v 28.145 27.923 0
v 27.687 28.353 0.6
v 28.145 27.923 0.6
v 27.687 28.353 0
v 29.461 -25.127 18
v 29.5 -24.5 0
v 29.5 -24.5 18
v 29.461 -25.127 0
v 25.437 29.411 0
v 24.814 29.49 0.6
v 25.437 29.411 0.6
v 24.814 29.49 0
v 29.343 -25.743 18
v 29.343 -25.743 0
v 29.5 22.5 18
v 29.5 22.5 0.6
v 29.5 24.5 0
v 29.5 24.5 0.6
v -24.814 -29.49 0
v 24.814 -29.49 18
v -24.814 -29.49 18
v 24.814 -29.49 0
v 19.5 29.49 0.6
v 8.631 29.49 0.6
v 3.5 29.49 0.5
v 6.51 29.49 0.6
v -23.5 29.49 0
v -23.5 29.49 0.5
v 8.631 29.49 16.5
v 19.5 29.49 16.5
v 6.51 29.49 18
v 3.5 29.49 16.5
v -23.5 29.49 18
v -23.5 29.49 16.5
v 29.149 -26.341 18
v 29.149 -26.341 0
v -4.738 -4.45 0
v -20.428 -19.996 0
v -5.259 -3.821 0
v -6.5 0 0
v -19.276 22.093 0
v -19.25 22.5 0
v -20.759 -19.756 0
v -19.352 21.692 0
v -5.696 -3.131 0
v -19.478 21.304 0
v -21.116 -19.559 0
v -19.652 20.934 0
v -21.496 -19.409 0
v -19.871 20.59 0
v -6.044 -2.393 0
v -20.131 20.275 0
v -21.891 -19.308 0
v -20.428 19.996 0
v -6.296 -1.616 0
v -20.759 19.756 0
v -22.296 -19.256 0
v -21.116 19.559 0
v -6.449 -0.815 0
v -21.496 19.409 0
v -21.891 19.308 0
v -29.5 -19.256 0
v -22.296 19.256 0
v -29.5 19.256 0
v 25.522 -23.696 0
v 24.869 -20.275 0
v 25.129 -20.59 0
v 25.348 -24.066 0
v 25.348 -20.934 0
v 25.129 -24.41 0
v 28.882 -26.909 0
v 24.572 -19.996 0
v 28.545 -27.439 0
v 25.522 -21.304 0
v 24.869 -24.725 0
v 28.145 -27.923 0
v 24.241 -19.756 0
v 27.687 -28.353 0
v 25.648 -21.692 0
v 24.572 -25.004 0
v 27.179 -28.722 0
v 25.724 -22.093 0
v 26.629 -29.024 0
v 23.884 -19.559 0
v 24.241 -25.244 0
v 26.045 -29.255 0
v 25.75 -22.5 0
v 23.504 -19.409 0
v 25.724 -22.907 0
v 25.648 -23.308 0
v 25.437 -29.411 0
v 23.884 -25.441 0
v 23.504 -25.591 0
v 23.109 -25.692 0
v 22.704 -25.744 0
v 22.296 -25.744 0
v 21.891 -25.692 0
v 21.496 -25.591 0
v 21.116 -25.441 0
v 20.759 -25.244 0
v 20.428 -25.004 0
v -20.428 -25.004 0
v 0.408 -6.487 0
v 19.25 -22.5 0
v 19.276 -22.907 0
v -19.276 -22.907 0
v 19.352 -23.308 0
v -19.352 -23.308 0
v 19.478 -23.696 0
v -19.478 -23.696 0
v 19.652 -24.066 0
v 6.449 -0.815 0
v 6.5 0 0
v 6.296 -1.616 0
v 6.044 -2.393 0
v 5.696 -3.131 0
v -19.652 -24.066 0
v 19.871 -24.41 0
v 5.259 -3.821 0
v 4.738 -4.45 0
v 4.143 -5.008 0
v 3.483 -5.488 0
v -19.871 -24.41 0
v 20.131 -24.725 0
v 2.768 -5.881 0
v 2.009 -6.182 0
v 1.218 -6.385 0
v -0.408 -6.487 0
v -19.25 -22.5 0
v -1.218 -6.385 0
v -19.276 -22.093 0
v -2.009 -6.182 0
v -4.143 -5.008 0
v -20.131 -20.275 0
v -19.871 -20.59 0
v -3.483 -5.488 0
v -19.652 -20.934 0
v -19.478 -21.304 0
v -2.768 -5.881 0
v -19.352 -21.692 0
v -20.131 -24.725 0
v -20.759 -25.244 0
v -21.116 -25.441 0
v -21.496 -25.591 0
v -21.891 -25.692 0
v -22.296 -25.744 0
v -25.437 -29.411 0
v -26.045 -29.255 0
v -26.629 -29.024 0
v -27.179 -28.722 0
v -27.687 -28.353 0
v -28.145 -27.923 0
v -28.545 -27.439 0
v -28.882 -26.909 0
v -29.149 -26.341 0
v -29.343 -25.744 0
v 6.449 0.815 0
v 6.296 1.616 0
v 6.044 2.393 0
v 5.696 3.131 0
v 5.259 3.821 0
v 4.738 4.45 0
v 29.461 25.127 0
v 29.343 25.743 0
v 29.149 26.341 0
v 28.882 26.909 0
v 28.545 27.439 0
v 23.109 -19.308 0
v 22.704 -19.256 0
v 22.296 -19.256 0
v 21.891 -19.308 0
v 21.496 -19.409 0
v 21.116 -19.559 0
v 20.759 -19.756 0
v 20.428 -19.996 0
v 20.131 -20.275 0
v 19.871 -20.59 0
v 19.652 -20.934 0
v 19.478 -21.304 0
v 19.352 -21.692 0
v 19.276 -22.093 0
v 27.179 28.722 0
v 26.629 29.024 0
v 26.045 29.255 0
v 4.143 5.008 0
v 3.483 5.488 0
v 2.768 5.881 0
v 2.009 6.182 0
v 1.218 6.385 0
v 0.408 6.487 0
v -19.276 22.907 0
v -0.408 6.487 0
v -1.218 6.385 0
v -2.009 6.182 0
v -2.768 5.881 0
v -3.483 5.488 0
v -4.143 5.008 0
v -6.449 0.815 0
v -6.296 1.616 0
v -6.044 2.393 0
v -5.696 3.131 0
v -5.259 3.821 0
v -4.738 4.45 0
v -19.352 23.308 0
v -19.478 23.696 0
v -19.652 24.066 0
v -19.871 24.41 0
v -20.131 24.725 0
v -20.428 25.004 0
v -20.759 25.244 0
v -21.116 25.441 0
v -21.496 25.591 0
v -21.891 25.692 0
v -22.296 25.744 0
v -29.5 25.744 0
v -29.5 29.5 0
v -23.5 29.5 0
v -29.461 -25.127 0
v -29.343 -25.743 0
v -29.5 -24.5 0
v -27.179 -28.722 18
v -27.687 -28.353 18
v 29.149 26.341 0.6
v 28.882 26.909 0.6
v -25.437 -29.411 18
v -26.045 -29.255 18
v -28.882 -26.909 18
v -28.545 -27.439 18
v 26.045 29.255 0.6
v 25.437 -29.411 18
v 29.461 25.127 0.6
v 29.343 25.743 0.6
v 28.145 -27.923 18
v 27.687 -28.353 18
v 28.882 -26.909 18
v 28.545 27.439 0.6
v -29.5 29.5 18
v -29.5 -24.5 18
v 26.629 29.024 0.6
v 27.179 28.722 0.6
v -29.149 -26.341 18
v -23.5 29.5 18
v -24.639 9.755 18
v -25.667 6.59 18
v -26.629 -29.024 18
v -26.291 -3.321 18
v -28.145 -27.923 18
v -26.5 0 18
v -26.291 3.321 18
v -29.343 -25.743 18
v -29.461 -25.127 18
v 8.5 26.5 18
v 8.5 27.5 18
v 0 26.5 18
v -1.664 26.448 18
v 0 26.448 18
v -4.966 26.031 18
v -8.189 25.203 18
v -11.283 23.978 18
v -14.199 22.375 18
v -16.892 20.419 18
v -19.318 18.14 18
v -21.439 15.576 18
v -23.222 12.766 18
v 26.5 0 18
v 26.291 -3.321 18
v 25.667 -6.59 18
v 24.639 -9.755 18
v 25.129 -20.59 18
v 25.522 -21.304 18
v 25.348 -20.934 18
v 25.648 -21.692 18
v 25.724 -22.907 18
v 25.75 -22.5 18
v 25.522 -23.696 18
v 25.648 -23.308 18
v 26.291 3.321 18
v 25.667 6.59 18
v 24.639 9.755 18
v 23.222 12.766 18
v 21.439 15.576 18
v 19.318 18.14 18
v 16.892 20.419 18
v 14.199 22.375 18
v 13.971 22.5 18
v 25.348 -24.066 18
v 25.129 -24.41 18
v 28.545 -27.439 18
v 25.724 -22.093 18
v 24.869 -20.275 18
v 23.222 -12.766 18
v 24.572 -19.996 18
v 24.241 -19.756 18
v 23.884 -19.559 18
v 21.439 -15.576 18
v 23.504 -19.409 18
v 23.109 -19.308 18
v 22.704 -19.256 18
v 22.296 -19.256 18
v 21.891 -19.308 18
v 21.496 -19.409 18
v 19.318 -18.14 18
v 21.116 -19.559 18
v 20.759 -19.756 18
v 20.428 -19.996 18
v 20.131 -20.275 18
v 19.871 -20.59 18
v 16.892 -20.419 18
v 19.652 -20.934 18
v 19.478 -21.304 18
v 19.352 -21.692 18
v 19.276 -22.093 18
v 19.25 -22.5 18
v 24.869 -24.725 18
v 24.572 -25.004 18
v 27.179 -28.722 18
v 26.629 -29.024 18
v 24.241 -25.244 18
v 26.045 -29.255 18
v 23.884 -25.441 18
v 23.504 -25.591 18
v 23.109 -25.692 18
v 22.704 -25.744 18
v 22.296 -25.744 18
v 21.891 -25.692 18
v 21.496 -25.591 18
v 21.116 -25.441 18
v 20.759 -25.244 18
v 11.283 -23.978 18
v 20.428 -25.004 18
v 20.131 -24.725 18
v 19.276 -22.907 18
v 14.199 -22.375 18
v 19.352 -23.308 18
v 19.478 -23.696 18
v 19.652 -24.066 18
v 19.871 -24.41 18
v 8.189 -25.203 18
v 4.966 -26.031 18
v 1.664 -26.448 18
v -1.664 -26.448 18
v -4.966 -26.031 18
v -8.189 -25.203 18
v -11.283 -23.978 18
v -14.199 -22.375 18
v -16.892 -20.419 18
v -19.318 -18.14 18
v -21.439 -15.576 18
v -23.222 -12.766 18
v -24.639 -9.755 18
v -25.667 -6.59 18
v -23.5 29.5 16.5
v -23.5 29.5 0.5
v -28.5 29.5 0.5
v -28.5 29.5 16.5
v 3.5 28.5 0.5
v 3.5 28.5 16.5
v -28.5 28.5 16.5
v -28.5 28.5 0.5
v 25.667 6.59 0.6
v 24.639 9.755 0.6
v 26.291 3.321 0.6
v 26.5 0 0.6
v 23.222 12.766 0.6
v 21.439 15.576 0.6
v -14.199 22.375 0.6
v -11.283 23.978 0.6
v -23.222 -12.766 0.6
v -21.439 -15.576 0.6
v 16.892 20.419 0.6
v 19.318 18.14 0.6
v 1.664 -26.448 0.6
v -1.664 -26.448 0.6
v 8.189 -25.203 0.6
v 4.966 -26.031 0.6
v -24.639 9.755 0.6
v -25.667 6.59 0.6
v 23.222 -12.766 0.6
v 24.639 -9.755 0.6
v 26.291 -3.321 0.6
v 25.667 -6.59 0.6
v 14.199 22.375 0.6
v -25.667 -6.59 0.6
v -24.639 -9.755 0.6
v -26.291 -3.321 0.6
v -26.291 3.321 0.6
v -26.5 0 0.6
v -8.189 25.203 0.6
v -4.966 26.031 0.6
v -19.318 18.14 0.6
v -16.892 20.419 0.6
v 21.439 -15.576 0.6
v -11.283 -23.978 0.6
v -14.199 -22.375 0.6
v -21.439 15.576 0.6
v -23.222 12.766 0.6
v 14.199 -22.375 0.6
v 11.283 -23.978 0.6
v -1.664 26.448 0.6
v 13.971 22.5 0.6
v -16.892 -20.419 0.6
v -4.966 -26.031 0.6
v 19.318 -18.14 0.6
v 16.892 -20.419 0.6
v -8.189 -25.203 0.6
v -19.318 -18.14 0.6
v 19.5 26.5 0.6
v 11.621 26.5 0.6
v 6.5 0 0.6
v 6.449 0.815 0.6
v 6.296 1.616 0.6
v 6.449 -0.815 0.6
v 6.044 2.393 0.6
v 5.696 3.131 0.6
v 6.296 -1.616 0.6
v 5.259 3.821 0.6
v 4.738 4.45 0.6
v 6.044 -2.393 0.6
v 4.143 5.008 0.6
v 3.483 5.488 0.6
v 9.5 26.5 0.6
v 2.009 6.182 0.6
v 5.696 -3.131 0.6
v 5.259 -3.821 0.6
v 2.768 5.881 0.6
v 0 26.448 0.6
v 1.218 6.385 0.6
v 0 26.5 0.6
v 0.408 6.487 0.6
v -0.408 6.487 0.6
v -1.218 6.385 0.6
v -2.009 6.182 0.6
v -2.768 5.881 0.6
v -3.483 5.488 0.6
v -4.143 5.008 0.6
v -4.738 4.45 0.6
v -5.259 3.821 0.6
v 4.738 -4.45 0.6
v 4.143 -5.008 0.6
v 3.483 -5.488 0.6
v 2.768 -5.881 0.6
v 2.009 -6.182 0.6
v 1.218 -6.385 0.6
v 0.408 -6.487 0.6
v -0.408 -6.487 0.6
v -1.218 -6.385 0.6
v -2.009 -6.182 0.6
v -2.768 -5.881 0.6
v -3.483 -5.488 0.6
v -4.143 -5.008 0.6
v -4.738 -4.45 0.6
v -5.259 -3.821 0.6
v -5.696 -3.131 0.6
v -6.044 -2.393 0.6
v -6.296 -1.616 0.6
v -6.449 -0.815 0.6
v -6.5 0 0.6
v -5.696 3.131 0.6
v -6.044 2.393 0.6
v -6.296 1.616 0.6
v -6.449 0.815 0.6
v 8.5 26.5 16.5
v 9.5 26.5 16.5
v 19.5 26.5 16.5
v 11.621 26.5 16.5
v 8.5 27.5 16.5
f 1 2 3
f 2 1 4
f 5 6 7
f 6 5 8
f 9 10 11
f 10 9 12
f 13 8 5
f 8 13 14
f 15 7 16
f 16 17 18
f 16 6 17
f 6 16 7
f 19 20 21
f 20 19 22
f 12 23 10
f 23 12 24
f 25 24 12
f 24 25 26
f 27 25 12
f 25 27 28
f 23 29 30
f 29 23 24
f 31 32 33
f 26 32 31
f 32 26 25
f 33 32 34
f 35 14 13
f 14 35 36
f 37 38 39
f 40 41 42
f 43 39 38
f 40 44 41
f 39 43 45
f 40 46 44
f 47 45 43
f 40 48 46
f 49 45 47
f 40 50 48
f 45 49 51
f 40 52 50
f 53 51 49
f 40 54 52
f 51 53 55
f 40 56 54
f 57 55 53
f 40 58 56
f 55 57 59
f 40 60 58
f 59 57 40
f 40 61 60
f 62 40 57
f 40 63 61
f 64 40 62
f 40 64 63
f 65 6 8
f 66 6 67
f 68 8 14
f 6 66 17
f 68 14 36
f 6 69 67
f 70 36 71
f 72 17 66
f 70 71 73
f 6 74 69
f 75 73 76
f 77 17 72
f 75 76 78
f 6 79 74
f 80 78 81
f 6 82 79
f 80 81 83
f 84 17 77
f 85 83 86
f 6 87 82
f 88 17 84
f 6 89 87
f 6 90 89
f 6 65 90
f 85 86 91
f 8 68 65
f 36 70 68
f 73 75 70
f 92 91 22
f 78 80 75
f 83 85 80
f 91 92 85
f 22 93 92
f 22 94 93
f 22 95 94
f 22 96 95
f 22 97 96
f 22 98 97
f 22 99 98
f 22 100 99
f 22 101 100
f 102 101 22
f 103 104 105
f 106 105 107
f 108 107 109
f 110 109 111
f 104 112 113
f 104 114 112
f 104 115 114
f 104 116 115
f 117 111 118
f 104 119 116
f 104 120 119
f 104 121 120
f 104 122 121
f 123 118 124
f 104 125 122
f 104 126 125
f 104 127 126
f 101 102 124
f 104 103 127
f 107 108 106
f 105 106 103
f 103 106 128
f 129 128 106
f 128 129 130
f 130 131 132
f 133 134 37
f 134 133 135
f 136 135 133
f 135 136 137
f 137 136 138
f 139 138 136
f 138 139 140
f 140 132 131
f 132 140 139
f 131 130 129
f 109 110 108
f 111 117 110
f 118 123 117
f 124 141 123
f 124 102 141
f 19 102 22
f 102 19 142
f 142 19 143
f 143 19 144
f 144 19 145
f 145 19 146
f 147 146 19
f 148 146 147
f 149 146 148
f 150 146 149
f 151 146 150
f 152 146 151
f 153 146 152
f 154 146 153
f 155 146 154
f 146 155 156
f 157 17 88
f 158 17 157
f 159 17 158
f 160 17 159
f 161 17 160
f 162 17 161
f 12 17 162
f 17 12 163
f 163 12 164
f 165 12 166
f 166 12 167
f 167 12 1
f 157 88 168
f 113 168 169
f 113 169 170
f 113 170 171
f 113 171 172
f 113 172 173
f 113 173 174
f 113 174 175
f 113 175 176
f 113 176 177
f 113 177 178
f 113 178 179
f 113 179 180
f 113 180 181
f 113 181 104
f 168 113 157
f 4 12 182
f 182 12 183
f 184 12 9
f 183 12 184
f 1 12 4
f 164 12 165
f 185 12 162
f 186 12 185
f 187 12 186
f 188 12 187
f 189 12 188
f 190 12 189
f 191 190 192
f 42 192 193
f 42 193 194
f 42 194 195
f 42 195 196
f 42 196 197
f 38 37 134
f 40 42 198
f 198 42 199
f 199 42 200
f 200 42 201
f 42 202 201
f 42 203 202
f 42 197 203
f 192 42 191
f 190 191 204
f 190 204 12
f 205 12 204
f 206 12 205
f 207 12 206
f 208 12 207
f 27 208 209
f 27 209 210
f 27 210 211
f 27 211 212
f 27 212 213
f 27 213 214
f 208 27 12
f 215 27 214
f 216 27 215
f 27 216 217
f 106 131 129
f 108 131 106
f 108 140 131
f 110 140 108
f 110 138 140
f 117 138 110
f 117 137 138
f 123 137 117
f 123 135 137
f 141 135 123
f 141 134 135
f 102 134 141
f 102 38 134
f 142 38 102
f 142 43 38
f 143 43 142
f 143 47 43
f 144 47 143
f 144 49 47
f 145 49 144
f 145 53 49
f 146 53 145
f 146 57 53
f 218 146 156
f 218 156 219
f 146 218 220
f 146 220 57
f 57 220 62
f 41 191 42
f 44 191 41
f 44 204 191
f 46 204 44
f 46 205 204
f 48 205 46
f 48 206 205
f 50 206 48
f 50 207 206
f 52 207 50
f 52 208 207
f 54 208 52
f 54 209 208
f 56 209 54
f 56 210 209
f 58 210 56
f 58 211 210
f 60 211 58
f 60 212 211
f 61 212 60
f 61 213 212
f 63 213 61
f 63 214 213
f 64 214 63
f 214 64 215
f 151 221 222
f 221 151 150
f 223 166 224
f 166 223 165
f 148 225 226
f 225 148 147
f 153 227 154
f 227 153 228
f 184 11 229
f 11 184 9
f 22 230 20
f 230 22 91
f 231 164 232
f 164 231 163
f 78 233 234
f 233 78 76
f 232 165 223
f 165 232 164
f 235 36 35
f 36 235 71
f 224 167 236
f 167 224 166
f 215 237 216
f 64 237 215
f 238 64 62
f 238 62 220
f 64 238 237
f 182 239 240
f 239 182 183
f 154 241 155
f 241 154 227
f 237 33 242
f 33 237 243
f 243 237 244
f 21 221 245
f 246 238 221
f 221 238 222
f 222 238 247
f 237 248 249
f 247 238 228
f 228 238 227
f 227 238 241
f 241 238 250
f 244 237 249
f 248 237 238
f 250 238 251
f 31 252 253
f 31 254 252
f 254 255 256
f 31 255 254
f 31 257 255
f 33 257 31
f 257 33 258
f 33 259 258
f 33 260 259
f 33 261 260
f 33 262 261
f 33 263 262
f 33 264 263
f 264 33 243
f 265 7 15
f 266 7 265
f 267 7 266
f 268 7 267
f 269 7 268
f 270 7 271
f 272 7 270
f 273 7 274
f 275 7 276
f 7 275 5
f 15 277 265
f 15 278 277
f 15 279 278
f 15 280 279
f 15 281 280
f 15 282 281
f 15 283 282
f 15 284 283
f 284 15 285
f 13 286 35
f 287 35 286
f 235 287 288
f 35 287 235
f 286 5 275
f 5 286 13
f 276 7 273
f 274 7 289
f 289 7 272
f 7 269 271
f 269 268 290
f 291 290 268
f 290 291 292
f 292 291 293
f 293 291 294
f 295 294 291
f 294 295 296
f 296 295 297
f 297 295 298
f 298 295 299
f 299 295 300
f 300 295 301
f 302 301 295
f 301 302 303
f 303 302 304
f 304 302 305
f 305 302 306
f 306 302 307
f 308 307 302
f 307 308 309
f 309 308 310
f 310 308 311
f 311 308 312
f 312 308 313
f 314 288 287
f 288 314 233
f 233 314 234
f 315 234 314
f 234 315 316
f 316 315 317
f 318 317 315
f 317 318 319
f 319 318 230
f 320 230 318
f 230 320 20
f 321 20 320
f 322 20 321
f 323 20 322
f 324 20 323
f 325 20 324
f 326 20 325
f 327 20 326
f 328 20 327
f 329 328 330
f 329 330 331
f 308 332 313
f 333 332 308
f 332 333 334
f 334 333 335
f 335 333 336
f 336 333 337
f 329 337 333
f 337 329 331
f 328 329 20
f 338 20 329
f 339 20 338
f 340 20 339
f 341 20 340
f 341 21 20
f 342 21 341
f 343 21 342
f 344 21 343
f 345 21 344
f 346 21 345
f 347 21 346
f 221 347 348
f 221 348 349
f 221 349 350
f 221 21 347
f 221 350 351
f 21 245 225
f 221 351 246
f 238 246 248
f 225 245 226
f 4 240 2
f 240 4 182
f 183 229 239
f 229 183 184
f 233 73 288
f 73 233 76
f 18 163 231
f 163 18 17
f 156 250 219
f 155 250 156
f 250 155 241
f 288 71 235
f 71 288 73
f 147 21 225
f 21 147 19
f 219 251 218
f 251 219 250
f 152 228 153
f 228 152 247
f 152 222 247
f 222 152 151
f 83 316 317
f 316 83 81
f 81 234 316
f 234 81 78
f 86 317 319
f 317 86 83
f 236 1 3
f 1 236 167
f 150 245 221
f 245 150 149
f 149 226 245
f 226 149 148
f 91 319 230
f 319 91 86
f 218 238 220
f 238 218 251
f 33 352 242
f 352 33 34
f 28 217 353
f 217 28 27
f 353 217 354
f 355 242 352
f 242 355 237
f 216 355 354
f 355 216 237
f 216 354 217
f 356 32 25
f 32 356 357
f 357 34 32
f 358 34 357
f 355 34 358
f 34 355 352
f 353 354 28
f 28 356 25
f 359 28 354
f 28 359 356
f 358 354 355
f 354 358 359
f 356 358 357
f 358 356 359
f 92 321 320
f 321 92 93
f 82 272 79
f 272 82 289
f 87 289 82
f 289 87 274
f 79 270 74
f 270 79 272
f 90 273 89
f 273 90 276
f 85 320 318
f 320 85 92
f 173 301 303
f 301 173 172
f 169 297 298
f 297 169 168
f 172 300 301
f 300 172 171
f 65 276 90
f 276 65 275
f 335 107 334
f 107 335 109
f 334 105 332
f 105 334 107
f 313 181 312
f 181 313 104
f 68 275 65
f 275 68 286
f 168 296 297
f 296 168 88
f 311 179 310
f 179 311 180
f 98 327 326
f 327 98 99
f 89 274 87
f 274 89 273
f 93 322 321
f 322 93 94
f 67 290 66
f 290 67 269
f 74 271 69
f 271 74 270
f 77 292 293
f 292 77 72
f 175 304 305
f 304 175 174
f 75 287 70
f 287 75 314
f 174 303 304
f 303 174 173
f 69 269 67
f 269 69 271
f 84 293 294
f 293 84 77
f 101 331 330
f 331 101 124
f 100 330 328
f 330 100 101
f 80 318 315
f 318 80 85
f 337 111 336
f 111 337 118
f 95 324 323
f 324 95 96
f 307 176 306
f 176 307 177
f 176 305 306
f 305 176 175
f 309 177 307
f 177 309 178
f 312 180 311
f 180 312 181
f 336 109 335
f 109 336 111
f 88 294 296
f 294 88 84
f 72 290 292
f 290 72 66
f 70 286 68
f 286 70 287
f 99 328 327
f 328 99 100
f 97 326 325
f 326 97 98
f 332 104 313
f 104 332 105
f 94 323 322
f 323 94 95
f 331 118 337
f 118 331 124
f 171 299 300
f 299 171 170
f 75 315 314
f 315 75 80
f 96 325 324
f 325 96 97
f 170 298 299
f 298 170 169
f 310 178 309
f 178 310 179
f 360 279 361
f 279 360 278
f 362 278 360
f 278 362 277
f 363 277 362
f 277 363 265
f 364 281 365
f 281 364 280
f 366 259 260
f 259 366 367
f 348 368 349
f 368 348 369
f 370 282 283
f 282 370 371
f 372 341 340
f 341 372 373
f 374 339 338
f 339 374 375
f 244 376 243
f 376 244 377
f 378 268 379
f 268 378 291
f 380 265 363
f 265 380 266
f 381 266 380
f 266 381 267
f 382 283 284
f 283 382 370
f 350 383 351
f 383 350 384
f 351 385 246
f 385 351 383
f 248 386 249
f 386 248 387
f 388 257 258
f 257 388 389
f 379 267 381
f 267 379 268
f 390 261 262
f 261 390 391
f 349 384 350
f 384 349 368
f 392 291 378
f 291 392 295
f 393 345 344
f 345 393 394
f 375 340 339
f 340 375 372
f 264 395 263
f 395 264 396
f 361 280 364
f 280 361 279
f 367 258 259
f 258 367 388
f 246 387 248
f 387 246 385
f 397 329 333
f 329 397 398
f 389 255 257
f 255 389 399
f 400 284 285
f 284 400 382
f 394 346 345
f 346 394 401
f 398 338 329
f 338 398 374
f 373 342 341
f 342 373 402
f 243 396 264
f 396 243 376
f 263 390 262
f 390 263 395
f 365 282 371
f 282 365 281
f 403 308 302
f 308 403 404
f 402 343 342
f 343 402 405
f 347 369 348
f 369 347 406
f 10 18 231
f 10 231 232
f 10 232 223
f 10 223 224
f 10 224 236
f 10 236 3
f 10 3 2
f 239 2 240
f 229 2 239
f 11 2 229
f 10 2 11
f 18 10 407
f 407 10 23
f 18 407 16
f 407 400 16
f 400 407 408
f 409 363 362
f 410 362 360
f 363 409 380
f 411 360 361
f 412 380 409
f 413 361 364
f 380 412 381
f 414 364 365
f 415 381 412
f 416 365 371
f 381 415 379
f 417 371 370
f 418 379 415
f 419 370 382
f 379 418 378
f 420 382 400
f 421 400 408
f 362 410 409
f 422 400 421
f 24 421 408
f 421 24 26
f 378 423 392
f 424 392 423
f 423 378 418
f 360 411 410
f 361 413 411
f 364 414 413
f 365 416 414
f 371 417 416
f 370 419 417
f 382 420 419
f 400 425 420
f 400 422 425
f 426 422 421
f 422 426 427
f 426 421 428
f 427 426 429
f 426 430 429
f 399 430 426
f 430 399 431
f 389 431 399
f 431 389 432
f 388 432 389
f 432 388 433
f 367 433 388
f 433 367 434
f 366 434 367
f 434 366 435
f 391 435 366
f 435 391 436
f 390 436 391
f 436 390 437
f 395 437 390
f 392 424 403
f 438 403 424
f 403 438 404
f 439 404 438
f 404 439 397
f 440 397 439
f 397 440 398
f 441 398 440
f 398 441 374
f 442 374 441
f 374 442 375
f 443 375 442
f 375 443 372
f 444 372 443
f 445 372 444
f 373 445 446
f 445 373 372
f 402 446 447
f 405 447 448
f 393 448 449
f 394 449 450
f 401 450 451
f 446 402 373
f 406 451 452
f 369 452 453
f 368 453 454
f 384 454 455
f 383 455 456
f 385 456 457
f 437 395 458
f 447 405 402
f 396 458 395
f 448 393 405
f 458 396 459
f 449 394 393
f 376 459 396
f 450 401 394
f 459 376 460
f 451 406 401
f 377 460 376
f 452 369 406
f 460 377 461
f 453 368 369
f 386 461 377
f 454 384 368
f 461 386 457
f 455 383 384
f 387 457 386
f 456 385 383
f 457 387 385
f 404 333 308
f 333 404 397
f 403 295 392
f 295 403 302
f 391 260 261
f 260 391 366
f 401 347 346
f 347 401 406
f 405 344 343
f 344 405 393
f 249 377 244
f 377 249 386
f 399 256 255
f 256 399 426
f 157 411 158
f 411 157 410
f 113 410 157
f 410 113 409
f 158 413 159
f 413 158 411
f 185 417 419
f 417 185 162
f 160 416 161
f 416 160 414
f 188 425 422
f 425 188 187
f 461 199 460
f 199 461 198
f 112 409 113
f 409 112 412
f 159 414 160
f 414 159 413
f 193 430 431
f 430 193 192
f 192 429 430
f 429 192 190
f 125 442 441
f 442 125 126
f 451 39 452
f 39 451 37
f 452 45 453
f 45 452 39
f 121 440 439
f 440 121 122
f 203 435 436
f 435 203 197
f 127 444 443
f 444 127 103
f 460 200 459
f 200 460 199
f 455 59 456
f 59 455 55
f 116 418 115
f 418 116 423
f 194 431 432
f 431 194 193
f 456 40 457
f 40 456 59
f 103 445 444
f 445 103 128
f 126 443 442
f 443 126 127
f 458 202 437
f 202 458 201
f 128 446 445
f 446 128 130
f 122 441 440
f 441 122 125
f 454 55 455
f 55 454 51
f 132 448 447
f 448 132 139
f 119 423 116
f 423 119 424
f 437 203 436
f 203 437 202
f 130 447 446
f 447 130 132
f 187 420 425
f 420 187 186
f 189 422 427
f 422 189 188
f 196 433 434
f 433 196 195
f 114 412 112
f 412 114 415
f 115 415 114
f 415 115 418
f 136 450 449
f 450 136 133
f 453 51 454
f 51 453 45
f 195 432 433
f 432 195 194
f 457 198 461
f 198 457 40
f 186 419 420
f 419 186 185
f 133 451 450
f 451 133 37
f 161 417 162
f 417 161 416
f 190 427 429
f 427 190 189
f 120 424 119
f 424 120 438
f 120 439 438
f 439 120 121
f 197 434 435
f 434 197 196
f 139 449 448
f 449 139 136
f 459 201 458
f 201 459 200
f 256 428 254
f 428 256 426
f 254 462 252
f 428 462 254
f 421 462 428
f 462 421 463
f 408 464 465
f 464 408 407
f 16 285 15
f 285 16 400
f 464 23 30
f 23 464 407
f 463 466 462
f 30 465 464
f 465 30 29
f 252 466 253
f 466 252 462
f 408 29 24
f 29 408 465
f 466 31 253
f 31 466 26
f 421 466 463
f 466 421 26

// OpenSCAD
$fn = 50;


difference() {
	union() {
		hull() {
			translate(v = [-24.5000000000, 24.5000000000, 0]) {
				cylinder(h = 18, r = 5);
			}
			translate(v = [24.5000000000, 24.5000000000, 0]) {
				cylinder(h = 18, r = 5);
			}
			translate(v = [-24.5000000000, -24.5000000000, 0]) {
				cylinder(h = 18, r = 5);
			}
			translate(v = [24.5000000000, -24.5000000000, 0]) {
				cylinder(h = 18, r = 5);
			}
		}
		translate(v = [-29.5000000000, 23.5000000000, 0]) {
			cube(size = [6, 6, 18]);
		}
	}
	union() {
		translate(v = [-30.0000000000, -22.5000000000, -250.0000000000]) {
			rotate(a = [0, 0, 0]) {
				difference() {
					union() {
						hull() {
							translate(v = [7.5000000000, 0, 0]) {
								cylinder(h = 250, r = 3.2500000000, r1 = 3.2500000000, r2 = 3.2500000000);
							}
							translate(v = [-7.5000000000, 0, 0]) {
								cylinder(h = 250, r = 3.2500000000, r1 = 3.2500000000, r2 = 3.2500000000);
							}
						}
					}
					union();
				}
			}
		}
		translate(v = [-30.0000000000, 22.5000000000, -250.0000000000]) {
			rotate(a = [0, 0, 0]) {
				difference() {
					union() {
						hull() {
							translate(v = [7.5000000000, 0, 0]) {
								cylinder(h = 250, r = 3.2500000000, r1 = 3.2500000000, r2 = 3.2500000000);
							}
							translate(v = [-7.5000000000, 0, 0]) {
								cylinder(h = 250, r = 3.2500000000, r1 = 3.2500000000, r2 = 3.2500000000);
							}
						}
					}
					union();
				}
			}
		}
		translate(v = [-28.5000000000, 28.5000000000, 0.5000000000]) {
			cube(size = [32, 1, 16]);
		}
		translate(v = [22.5000000000, -22.5000000000, -50.0000000000]) {
			cylinder(h = 100, r = 3.2500000000);
		}
		translate(v = [0, 0, 0.6000000000]) {
			cylinder(h = 20.4000000000, r = 26.5000000000);
		}
		translate(v = [0, 0, -9.0000000000]) {
			cylinder(h = 18, r = 6.5000000000);
		}
		translate(v = [0.0000000000, 22.5000000000, 0.6000000000]) {
			cube(size = [29.5000000000, 4, 20.4000000000]);
		}
		translate(v = [19.5000000000, 22.5000000000, 0.6000000000]) {
			cube(size = [10, 7, 20.4000000000]);
		}
		translate(v = [8.5000000000, 22.5000000000, 16.5000000000]) {
			cube(size = [21, 7, 1.5000000000]);
		}
		translate(v = [5.7500000000, 30.2500000000, 0.6000000000]) {
			rotate(a = [0, 0, -45]) {
				cube(size = [7.5000000000, 1.5000000000, 20.4000000000]);
			}
		}
		translate(v = [5.0610000000, 20.5000000000, 0.6000000000]) {
			cube(size = [7.5000000000, 2, 17.4000000000]);
		}
	}
}
